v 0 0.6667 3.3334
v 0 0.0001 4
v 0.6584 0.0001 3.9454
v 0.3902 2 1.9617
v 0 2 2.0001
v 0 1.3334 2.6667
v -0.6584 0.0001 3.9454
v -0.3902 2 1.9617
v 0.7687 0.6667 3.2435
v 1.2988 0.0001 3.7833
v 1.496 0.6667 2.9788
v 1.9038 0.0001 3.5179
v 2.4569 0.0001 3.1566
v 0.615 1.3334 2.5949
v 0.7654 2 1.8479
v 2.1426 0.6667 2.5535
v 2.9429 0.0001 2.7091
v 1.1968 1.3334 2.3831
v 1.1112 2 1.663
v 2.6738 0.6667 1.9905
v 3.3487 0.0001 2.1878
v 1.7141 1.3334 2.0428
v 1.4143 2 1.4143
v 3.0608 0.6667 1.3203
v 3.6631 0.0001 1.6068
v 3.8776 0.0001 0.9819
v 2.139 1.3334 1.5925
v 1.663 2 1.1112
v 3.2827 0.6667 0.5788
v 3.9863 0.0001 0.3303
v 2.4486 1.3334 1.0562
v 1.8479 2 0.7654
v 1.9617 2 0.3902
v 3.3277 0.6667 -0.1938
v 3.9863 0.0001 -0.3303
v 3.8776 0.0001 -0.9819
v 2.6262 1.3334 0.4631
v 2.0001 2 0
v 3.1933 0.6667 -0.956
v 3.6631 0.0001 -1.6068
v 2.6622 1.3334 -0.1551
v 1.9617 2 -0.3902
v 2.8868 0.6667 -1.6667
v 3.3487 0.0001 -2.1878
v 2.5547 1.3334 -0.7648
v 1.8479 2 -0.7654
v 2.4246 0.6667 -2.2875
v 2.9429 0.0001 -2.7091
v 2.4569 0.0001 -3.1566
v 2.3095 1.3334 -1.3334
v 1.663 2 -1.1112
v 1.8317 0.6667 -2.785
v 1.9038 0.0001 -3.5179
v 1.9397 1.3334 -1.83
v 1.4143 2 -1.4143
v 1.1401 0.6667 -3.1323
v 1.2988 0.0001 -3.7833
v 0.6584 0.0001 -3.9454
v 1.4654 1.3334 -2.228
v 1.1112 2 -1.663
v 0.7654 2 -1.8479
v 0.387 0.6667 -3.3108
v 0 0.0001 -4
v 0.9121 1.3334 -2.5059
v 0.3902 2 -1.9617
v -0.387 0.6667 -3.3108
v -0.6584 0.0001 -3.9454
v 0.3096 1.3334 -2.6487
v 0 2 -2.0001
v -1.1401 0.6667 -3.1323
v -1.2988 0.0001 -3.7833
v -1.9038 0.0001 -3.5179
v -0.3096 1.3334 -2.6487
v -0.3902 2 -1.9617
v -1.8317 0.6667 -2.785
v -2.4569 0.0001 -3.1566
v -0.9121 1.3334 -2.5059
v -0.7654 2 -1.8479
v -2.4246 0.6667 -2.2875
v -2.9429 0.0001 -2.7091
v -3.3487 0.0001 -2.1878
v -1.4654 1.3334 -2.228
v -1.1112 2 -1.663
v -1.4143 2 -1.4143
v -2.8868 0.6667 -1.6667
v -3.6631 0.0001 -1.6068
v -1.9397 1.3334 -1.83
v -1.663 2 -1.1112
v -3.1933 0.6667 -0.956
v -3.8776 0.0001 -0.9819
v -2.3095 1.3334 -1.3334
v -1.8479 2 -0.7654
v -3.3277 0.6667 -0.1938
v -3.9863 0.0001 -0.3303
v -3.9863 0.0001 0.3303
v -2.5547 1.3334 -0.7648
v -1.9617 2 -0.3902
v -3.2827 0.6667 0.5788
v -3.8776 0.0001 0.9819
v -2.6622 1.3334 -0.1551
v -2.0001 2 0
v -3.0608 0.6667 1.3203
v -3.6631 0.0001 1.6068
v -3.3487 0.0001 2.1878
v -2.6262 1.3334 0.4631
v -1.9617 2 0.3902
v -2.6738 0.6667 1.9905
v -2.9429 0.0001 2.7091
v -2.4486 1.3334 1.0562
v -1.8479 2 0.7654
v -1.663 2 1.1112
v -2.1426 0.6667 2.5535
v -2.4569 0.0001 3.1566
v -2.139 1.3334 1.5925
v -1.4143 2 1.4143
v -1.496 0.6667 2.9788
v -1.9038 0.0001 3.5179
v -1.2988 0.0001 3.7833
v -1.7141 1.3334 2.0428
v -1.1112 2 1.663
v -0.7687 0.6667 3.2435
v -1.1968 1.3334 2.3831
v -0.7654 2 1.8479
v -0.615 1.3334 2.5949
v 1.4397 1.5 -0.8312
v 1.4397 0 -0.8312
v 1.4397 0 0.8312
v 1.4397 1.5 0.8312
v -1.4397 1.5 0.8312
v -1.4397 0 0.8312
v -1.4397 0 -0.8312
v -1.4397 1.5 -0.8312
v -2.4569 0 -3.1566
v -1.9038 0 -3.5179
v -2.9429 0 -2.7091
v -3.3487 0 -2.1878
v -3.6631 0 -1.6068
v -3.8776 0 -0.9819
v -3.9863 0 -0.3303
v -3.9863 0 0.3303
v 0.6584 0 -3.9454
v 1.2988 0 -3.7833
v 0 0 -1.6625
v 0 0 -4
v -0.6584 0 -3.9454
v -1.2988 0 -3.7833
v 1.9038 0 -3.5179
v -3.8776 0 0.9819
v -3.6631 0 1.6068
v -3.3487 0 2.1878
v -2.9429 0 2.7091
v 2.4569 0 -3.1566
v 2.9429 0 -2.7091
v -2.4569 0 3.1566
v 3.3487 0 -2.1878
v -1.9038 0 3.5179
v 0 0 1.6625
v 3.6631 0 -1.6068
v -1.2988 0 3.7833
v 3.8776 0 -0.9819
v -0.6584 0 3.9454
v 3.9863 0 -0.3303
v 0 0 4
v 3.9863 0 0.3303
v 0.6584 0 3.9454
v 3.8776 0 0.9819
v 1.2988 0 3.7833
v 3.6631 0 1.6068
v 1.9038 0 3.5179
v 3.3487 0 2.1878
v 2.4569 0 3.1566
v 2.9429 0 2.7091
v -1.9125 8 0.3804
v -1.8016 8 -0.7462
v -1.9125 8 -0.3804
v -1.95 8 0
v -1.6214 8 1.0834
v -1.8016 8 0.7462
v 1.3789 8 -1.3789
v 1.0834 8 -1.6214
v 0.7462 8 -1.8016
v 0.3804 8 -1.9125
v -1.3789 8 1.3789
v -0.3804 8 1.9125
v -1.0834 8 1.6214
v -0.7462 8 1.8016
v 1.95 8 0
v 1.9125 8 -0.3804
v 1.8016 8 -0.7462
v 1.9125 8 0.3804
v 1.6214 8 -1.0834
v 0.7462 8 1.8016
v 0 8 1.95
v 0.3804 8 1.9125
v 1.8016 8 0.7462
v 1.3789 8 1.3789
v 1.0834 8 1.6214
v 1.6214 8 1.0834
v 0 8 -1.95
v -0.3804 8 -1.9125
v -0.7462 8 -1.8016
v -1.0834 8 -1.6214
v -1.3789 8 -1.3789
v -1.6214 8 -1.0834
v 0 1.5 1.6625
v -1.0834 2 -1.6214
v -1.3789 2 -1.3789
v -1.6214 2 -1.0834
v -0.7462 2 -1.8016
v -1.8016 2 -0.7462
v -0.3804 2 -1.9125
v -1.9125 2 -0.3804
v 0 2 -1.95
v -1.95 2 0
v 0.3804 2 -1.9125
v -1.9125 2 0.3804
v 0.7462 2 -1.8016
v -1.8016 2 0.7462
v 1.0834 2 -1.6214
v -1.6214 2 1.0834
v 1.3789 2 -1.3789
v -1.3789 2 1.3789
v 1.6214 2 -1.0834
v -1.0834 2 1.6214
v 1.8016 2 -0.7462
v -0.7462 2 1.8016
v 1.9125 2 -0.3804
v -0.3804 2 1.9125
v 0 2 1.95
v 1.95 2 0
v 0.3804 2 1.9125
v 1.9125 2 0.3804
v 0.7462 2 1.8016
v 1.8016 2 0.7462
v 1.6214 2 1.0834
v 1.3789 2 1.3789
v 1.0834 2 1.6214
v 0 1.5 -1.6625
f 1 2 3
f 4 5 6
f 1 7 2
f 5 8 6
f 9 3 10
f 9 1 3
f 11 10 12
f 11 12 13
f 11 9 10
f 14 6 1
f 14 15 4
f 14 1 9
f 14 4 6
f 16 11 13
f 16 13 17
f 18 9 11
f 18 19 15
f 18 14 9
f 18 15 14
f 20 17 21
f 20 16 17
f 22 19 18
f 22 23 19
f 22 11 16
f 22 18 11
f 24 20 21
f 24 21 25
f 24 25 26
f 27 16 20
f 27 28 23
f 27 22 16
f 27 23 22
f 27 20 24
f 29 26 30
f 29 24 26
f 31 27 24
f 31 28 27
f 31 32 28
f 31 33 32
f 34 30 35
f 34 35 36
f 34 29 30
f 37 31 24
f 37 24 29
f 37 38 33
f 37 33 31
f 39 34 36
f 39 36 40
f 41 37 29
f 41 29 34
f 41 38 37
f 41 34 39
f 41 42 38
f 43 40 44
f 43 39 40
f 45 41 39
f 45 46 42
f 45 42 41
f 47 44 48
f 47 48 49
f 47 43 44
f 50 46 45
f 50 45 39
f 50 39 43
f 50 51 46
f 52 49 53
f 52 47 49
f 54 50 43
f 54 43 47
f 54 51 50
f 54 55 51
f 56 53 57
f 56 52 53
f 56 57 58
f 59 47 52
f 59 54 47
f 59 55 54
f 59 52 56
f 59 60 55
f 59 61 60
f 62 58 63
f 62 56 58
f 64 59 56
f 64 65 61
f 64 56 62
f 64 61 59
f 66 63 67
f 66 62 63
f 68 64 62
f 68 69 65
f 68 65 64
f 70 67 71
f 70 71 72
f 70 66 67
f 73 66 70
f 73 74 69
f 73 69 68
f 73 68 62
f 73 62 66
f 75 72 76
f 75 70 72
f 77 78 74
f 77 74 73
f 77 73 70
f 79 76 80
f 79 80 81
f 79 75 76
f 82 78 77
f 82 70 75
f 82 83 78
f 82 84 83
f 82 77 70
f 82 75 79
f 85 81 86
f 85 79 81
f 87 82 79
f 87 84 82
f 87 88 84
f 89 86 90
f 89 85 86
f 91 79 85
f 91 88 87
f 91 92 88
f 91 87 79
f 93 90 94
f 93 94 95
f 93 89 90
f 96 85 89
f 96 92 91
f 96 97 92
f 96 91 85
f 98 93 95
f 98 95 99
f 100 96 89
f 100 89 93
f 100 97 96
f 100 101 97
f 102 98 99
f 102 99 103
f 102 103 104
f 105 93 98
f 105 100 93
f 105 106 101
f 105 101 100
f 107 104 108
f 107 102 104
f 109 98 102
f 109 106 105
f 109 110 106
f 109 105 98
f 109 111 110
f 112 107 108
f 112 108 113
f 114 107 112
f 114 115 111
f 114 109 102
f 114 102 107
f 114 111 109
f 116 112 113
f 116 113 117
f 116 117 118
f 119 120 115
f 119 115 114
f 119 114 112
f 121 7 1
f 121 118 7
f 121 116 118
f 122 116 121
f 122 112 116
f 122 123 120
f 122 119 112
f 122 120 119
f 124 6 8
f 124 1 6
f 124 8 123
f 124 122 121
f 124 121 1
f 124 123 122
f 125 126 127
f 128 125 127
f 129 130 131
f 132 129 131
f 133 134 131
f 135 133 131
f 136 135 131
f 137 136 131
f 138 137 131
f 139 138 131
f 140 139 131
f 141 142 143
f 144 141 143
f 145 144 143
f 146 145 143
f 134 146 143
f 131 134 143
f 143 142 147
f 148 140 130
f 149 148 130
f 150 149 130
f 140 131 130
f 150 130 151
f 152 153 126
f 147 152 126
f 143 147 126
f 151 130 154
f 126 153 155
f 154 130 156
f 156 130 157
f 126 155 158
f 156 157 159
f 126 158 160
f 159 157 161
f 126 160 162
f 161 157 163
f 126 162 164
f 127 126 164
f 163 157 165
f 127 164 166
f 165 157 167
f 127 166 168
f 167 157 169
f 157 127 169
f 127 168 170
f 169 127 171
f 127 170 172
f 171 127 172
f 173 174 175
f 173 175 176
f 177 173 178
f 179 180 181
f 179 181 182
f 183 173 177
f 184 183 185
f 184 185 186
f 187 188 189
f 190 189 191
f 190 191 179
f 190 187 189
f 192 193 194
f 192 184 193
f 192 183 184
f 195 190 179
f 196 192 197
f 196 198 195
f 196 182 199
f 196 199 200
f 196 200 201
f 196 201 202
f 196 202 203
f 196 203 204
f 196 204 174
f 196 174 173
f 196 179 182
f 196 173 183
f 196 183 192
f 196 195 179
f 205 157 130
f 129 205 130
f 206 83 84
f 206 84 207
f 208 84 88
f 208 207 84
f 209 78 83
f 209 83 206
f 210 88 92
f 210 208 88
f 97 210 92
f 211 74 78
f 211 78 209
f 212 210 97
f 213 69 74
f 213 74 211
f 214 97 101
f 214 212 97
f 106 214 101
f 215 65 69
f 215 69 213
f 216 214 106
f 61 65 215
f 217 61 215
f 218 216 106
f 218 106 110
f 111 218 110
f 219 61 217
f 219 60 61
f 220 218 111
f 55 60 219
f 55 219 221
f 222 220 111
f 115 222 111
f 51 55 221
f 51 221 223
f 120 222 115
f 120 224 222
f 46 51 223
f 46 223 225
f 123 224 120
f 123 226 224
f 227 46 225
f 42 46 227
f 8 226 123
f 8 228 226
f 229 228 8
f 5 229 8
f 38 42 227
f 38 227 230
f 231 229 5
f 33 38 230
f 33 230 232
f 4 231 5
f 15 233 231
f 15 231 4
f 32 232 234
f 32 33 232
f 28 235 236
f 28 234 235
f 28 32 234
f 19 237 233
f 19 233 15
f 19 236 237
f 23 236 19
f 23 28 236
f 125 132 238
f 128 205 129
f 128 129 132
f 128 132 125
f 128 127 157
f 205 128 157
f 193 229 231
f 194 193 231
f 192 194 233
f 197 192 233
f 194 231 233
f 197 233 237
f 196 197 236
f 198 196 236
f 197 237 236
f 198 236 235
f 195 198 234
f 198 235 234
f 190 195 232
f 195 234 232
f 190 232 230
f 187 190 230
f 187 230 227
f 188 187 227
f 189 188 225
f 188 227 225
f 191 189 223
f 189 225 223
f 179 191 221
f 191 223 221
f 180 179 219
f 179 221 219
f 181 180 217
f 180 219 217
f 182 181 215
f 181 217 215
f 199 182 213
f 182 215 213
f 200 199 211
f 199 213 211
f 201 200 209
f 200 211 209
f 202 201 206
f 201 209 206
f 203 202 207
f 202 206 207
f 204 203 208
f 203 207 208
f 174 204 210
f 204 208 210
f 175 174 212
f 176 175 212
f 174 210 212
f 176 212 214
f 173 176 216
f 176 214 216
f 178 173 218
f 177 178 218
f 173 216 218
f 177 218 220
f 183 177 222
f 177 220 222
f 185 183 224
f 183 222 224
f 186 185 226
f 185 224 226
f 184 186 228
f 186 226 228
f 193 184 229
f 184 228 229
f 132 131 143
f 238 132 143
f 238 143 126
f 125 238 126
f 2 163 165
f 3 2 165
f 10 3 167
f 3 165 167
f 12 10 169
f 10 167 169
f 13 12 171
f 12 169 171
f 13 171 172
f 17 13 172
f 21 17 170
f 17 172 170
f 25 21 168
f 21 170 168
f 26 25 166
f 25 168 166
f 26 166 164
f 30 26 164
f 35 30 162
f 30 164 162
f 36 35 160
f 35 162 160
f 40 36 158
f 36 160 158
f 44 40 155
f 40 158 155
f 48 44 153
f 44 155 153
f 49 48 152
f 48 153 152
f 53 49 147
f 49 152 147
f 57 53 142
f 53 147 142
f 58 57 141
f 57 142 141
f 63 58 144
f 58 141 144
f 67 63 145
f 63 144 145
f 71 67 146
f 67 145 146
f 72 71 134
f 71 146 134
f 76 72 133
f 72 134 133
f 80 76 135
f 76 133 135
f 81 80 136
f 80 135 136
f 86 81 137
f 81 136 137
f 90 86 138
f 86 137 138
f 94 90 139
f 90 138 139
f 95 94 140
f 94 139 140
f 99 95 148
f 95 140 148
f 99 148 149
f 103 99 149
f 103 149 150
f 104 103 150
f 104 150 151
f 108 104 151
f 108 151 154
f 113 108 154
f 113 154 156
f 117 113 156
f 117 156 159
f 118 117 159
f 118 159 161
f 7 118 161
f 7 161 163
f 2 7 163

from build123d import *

# Parameters (mm, degrees)
SKETCH1_R           = 4
BOSS_EXTRUDE1_DEPTH = 2
SKETCH2_R           = 1.95
BOSS_EXTRUDE2_DEPTH = 6
CHAMFER1_SIZE       = 2
CUT_EXTRUDE1_DEPTH  = 1.5


with BuildPart() as part:
    # Sketch1 → Boss-Extrude1 (new body)
    with BuildSketch(Plane(origin=(0, 0, 0), x_dir=(1, 0, 0), z_dir=(0, 1, 0))):
        with Locations(Location((0, 0, 0), (0, 0, 270))):
            Circle(SKETCH1_R)
    extrude(amount=BOSS_EXTRUDE1_DEPTH)

    # Sketch2 → Boss-Extrude2 (add)
    with BuildSketch(Plane(origin=(0, 2, 0), x_dir=(1, 0, 0), z_dir=(0, 1, 0))):
        with Locations(Location((0, 0, 0), (0, 0, 270))):
            Circle(SKETCH2_R)
    extrude(amount=BOSS_EXTRUDE2_DEPTH)

    # Chamfer1
    chamfer1_edges = [part.edges().sort_by_distance(p)[0] for p in [
        (0, 2, -4),
    ]]
    chamfer(chamfer1_edges, length=CHAMFER1_SIZE - 0.0001)  # a hair under: the kernel refuses the full size

    # Sketch3 → Cut-Extrude1 (cut)
    with BuildSketch(Plane.XZ):
        Polygon((0, -1.662470902), (1.439742034, -0.831235451), (1.439742034, 0.831235451), (0, 1.662470902), (-1.439742034, 0.831235451), (-1.439742034, -0.831235451), align=None)
    extrude(amount=-CUT_EXTRUDE1_DEPTH, mode=Mode.SUBTRACT)


solid = part.part
